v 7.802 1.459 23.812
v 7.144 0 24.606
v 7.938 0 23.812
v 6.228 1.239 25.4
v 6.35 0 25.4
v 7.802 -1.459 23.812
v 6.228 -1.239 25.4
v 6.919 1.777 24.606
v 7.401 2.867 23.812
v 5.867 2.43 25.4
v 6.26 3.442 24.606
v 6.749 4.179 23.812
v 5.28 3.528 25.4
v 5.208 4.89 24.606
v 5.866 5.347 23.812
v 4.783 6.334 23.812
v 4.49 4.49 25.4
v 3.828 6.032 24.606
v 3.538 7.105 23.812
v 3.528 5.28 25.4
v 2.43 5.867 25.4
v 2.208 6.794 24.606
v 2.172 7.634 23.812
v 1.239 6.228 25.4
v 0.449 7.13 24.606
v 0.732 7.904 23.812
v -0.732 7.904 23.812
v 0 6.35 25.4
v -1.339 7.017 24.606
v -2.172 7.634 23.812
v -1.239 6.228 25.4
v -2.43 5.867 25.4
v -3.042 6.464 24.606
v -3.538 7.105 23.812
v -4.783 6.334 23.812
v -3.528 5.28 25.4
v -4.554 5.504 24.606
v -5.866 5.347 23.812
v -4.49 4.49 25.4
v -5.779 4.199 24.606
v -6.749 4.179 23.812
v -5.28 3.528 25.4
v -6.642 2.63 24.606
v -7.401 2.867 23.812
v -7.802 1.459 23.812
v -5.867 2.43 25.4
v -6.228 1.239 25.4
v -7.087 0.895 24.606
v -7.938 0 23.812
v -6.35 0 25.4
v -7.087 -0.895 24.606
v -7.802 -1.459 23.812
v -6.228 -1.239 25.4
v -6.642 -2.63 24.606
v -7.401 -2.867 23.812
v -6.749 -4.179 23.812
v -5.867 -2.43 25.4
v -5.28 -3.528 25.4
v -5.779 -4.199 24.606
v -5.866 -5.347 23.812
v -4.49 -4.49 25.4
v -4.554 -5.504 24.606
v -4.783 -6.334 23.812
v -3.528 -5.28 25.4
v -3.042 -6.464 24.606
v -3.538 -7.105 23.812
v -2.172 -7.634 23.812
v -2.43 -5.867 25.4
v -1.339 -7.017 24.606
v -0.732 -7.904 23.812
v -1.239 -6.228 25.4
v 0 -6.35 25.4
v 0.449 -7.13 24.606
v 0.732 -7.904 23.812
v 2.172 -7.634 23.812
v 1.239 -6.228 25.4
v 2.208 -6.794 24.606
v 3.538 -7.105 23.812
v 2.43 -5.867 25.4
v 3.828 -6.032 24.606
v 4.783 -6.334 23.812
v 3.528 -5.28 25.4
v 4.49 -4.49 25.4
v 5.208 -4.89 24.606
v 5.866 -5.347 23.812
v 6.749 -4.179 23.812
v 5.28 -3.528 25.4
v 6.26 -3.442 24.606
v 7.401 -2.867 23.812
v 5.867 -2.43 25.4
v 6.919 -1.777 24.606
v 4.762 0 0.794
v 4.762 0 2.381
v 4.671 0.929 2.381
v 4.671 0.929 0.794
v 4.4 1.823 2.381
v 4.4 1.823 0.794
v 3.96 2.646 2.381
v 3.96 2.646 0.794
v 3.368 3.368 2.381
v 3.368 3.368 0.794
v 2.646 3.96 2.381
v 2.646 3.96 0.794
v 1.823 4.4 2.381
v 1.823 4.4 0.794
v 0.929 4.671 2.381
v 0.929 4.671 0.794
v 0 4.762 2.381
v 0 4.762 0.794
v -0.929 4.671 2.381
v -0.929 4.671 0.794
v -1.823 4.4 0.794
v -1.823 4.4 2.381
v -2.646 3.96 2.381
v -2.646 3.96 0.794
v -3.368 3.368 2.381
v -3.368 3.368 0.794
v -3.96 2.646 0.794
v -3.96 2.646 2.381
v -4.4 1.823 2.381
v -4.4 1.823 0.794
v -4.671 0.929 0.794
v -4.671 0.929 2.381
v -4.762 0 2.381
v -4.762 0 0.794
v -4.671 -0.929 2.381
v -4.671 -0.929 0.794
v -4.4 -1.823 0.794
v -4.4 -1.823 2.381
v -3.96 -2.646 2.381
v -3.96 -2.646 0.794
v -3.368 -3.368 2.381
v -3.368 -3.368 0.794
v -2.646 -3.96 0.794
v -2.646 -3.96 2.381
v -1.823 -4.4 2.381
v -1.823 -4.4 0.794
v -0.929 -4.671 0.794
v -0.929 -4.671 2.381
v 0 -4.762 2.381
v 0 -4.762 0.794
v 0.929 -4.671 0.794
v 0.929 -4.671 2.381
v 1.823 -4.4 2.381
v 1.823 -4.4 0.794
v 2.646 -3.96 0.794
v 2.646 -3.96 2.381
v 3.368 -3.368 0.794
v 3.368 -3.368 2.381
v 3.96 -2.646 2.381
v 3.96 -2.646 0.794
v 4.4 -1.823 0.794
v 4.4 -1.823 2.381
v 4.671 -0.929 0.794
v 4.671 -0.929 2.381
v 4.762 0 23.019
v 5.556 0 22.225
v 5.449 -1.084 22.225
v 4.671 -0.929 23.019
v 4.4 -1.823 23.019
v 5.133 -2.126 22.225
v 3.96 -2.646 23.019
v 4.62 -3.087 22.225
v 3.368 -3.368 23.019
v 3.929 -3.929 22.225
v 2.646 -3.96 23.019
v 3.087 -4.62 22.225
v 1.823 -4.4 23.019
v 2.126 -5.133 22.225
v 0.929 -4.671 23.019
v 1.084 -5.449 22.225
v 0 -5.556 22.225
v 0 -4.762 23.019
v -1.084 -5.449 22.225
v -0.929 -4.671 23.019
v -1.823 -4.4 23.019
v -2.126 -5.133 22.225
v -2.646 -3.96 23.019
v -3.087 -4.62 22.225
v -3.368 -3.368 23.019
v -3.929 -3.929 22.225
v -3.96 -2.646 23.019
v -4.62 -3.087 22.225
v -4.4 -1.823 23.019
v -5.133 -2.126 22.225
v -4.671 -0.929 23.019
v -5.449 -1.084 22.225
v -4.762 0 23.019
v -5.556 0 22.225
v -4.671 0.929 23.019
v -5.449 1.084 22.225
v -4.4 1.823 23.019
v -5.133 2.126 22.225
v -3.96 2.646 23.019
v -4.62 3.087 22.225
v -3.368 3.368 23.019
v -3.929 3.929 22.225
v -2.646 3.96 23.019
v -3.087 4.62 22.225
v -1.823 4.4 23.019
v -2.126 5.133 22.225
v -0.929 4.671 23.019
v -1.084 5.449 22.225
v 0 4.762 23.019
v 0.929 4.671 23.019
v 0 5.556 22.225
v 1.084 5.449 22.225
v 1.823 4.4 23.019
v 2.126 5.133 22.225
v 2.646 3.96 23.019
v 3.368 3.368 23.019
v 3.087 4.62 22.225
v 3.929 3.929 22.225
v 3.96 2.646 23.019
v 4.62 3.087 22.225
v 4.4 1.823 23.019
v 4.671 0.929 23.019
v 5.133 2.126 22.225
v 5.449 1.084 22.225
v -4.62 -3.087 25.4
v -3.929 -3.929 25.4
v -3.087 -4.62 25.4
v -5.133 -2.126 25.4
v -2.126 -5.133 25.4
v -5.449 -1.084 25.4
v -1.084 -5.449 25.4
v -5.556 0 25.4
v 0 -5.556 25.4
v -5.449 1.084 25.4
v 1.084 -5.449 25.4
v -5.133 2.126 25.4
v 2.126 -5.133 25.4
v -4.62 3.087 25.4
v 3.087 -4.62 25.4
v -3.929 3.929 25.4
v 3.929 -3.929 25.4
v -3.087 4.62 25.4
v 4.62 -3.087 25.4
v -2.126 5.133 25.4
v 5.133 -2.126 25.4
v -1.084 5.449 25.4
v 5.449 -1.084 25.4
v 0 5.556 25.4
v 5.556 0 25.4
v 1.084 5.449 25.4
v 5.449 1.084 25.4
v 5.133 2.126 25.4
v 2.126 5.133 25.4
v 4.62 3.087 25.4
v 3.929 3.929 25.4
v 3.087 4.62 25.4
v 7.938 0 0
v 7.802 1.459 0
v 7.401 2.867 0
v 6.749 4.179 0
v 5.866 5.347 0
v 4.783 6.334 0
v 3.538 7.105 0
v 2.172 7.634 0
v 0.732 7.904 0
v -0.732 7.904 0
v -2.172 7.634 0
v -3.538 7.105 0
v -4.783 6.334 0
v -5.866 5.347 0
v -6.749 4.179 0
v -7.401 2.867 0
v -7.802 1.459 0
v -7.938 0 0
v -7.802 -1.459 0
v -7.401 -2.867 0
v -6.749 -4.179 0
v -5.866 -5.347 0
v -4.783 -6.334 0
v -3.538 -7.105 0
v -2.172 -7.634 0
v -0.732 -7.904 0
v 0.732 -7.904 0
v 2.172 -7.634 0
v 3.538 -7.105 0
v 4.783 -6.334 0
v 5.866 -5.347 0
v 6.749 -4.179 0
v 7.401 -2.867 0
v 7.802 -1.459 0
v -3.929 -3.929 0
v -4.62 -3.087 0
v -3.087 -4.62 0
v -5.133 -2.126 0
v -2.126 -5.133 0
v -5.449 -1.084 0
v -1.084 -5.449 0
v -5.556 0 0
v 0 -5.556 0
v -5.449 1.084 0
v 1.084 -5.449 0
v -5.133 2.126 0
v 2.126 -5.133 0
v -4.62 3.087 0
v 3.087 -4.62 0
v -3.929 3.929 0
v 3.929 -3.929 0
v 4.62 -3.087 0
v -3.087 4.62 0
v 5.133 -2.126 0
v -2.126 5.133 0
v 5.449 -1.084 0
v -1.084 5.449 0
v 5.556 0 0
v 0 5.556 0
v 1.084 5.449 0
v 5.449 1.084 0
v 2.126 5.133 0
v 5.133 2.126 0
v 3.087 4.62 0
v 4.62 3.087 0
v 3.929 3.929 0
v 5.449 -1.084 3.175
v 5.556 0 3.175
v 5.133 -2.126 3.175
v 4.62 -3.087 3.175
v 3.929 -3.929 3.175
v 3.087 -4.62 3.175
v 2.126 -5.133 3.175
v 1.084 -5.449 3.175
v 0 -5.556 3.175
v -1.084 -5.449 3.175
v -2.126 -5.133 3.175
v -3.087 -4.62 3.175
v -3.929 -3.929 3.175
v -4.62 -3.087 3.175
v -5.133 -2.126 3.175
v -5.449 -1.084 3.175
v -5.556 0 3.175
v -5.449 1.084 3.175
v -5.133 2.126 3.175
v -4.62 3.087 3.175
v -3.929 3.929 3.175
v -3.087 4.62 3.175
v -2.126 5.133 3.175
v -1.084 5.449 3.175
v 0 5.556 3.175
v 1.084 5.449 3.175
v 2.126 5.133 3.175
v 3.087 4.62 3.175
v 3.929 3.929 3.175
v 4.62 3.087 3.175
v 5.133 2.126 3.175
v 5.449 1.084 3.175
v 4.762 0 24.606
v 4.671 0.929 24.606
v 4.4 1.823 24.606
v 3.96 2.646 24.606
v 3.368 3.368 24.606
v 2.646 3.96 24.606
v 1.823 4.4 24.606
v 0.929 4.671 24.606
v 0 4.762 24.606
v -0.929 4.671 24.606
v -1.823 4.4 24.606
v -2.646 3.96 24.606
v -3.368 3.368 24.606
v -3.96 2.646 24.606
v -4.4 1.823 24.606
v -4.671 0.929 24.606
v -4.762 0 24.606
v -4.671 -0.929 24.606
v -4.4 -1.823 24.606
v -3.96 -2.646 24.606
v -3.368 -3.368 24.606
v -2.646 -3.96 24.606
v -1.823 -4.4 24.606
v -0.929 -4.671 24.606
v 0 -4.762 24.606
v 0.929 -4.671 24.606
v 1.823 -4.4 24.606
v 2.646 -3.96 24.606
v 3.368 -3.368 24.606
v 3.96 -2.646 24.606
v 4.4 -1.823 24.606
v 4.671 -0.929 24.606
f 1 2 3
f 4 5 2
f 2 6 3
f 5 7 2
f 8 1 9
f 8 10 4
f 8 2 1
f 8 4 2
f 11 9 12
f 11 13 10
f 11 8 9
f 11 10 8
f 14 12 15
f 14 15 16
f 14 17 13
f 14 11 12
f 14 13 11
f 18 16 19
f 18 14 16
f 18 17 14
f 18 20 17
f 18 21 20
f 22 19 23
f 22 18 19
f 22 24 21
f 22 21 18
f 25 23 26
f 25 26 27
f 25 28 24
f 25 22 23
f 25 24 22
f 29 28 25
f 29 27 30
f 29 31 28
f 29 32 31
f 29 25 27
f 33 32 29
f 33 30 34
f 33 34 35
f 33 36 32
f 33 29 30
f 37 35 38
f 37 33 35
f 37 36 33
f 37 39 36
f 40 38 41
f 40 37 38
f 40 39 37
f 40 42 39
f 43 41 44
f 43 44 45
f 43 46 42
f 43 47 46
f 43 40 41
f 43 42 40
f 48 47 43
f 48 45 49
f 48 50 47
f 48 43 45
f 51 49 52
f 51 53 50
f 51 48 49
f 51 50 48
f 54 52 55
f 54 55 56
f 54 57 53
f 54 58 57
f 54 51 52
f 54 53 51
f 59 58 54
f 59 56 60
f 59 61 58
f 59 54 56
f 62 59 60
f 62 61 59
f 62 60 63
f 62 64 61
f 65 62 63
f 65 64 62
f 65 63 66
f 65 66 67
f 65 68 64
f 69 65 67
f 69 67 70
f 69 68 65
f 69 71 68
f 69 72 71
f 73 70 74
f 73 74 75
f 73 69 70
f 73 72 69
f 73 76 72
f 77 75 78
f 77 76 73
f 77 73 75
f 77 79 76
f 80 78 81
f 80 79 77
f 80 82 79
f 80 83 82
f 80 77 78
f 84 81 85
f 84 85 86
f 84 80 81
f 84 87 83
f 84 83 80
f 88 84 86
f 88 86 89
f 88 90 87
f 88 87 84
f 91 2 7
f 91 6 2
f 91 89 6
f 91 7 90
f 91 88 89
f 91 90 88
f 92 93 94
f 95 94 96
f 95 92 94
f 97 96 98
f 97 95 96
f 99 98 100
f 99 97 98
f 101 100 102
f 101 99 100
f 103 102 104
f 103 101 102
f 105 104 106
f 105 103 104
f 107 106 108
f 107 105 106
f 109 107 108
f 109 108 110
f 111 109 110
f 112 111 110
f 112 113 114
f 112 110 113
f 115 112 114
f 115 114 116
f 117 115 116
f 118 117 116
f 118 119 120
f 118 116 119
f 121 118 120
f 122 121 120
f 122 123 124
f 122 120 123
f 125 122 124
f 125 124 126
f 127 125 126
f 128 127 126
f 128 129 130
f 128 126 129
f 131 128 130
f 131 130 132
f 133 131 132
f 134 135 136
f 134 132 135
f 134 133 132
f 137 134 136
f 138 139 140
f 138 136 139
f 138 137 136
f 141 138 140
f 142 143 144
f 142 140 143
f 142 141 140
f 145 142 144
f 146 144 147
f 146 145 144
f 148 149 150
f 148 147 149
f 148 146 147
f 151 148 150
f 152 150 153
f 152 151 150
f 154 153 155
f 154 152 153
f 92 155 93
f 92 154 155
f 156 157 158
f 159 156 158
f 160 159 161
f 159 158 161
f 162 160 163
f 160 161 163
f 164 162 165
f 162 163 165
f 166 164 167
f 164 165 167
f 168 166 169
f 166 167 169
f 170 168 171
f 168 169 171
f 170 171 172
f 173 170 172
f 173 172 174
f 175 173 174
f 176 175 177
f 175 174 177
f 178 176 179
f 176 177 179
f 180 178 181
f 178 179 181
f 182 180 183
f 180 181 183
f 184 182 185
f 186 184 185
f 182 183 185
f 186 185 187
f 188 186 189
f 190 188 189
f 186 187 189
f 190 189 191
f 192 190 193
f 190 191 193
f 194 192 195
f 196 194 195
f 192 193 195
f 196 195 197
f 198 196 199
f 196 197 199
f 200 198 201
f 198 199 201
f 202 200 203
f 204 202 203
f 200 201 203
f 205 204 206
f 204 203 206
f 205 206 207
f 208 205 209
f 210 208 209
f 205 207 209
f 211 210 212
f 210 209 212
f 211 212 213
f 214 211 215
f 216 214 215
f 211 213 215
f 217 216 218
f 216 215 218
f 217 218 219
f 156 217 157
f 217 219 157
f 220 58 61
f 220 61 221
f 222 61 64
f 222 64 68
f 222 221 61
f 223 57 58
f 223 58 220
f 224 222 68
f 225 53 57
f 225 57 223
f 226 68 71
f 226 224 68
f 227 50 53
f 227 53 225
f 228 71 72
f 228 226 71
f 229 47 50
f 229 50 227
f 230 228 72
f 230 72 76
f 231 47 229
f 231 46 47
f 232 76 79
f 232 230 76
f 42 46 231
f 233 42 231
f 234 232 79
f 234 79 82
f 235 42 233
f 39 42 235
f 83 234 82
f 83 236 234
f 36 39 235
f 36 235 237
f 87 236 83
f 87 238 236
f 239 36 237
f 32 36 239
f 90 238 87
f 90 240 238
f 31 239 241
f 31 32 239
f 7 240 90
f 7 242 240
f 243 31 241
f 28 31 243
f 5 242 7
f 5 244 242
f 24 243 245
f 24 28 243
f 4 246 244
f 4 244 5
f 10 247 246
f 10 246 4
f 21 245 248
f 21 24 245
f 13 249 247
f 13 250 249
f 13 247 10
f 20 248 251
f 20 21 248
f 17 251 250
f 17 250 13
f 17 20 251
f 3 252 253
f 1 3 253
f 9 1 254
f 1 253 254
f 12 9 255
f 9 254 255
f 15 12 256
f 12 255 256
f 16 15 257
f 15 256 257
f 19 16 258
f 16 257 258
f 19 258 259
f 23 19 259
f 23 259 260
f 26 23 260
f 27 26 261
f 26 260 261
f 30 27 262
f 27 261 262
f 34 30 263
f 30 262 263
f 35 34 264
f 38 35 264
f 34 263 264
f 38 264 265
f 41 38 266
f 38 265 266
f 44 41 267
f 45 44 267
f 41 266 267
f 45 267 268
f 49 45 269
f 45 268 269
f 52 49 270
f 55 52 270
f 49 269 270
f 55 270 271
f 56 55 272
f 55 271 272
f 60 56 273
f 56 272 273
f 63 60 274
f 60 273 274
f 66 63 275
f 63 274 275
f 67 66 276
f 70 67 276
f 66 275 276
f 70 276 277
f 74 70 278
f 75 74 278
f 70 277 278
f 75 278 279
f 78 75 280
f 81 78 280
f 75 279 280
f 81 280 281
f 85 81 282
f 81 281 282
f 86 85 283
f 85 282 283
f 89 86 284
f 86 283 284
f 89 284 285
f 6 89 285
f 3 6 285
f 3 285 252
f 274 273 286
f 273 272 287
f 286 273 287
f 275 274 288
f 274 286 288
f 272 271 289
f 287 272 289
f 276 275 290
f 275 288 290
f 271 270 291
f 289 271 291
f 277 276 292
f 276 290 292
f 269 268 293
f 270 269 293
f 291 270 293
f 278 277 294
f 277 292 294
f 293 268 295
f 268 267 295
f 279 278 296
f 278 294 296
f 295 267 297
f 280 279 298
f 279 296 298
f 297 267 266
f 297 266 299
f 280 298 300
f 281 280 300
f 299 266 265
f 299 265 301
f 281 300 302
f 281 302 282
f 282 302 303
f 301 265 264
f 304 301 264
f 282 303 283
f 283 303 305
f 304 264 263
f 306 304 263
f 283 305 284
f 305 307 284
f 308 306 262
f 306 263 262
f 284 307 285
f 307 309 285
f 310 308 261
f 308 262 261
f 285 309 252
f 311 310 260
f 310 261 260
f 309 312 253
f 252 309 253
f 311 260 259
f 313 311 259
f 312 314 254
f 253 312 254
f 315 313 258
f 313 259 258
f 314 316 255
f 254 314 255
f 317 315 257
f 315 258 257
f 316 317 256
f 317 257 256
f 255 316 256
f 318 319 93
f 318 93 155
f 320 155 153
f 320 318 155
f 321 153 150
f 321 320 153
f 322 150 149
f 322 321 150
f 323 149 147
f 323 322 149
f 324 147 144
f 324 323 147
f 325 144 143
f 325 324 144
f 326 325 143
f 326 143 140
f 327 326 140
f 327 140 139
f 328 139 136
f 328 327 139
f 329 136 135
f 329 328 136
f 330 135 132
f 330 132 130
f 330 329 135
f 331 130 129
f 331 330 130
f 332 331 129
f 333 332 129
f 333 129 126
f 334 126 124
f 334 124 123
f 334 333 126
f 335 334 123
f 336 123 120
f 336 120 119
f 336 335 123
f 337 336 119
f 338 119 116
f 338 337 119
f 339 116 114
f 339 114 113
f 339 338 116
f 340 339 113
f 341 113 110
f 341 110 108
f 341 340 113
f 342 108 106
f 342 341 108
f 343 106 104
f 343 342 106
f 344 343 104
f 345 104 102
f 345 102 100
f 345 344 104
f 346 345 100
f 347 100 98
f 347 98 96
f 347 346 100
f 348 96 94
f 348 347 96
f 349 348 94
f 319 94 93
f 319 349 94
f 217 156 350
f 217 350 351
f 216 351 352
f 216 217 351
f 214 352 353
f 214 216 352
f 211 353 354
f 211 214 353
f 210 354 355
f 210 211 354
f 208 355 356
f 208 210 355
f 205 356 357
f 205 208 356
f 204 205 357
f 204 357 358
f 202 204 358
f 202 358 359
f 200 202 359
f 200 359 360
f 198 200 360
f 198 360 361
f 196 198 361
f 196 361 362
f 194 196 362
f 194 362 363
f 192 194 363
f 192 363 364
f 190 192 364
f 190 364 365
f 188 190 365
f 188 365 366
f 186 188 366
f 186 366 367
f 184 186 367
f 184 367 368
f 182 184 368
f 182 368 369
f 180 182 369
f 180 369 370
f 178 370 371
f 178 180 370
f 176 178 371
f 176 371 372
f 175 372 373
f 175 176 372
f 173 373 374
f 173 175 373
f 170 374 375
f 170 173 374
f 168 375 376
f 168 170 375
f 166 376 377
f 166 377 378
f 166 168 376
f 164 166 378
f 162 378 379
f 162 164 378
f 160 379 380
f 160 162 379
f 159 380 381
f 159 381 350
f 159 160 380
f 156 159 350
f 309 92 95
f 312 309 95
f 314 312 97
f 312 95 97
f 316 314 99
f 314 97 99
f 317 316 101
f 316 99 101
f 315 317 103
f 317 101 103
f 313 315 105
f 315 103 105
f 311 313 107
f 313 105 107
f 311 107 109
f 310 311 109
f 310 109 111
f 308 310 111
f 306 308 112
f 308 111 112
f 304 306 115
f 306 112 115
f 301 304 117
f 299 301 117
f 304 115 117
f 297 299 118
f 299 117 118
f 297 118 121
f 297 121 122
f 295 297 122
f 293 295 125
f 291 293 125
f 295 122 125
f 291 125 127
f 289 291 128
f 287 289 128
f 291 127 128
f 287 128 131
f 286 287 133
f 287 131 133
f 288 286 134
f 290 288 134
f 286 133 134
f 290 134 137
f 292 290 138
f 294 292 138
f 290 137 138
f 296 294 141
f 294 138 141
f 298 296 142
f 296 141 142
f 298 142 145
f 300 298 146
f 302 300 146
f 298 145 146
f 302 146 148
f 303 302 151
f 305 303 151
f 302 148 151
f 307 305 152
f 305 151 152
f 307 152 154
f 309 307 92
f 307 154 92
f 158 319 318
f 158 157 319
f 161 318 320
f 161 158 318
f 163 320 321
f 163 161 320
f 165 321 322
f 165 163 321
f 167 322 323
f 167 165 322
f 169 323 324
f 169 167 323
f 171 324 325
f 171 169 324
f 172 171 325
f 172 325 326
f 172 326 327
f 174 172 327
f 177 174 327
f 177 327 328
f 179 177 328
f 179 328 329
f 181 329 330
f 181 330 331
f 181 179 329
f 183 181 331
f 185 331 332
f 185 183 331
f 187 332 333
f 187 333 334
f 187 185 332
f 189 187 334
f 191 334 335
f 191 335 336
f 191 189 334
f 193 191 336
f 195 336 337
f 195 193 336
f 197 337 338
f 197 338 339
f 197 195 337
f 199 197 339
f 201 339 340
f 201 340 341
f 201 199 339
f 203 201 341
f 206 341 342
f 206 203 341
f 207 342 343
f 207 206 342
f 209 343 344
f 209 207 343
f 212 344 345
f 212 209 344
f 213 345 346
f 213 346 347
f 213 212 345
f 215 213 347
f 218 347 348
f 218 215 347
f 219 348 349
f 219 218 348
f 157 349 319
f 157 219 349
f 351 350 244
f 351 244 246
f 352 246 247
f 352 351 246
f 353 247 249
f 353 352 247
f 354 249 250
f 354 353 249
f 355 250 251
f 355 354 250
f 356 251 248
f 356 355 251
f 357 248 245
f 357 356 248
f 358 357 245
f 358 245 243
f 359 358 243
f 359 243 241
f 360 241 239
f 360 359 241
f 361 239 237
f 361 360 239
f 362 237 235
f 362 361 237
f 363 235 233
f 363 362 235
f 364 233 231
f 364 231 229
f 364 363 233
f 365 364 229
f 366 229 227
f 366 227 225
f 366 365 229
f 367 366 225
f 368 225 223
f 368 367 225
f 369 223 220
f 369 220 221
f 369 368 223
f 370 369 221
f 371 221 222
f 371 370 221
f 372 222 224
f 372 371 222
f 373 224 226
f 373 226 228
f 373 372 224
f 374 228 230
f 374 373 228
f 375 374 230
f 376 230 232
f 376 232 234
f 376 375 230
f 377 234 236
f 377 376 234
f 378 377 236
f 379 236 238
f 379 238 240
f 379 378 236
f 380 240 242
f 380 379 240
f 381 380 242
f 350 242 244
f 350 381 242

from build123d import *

# Parameters (mm, degrees)
F0_R     = 7.9375
F0_R_2   = 4.7625
F1_DEPTH = 25.4
F2_SIZE  = 1.5875
F3_W     = 5.55625
F3_H     = 19.05
F5_SIZE  = 0.79374


# Not quite as in the source:
# - a fillet or chamfer is up to 0.001 mm smaller than in the source, because OpenCascade refuses the exact size


with BuildPart() as f1:
    # F0 (on Top) → F1 (new body)
    with BuildSketch(Plane.XY):
        Circle(F0_R)
        Circle(F0_R_2, mode=Mode.SUBTRACT)
    extrude(amount=F1_DEPTH)

    # F2
    f2_edges = [f1.edges().sort_by_distance(p)[0] for p in [
        (-7.9375, 0, 25.4),
    ]]
    chamfer(f2_edges, length=F2_SIZE)

    # F3 (on Front) → F4 (revolve, cut)
    with BuildSketch(Plane.XZ):
        with Locations((2.778125, 12.7)):
            Rectangle(F3_W, F3_H)
    revolve(axis=Axis((0, 0, 0), (0, 0, -1)), mode=Mode.SUBTRACT)

    # F5 (size 0.79375 in the source; OpenCascade refuses exactly that, so slightly less here)
    f5_edges = [f1.edges().sort_by_distance(p)[0] for p in [
        (-4.7625, 0, 0),
        (-4.7625, 0, 3.175),
        (-4.7625, 0, 22.225),
        (-4.7625, 0, 25.4),
    ]]
    chamfer(f5_edges, length=F5_SIZE)


solid = f1.part
